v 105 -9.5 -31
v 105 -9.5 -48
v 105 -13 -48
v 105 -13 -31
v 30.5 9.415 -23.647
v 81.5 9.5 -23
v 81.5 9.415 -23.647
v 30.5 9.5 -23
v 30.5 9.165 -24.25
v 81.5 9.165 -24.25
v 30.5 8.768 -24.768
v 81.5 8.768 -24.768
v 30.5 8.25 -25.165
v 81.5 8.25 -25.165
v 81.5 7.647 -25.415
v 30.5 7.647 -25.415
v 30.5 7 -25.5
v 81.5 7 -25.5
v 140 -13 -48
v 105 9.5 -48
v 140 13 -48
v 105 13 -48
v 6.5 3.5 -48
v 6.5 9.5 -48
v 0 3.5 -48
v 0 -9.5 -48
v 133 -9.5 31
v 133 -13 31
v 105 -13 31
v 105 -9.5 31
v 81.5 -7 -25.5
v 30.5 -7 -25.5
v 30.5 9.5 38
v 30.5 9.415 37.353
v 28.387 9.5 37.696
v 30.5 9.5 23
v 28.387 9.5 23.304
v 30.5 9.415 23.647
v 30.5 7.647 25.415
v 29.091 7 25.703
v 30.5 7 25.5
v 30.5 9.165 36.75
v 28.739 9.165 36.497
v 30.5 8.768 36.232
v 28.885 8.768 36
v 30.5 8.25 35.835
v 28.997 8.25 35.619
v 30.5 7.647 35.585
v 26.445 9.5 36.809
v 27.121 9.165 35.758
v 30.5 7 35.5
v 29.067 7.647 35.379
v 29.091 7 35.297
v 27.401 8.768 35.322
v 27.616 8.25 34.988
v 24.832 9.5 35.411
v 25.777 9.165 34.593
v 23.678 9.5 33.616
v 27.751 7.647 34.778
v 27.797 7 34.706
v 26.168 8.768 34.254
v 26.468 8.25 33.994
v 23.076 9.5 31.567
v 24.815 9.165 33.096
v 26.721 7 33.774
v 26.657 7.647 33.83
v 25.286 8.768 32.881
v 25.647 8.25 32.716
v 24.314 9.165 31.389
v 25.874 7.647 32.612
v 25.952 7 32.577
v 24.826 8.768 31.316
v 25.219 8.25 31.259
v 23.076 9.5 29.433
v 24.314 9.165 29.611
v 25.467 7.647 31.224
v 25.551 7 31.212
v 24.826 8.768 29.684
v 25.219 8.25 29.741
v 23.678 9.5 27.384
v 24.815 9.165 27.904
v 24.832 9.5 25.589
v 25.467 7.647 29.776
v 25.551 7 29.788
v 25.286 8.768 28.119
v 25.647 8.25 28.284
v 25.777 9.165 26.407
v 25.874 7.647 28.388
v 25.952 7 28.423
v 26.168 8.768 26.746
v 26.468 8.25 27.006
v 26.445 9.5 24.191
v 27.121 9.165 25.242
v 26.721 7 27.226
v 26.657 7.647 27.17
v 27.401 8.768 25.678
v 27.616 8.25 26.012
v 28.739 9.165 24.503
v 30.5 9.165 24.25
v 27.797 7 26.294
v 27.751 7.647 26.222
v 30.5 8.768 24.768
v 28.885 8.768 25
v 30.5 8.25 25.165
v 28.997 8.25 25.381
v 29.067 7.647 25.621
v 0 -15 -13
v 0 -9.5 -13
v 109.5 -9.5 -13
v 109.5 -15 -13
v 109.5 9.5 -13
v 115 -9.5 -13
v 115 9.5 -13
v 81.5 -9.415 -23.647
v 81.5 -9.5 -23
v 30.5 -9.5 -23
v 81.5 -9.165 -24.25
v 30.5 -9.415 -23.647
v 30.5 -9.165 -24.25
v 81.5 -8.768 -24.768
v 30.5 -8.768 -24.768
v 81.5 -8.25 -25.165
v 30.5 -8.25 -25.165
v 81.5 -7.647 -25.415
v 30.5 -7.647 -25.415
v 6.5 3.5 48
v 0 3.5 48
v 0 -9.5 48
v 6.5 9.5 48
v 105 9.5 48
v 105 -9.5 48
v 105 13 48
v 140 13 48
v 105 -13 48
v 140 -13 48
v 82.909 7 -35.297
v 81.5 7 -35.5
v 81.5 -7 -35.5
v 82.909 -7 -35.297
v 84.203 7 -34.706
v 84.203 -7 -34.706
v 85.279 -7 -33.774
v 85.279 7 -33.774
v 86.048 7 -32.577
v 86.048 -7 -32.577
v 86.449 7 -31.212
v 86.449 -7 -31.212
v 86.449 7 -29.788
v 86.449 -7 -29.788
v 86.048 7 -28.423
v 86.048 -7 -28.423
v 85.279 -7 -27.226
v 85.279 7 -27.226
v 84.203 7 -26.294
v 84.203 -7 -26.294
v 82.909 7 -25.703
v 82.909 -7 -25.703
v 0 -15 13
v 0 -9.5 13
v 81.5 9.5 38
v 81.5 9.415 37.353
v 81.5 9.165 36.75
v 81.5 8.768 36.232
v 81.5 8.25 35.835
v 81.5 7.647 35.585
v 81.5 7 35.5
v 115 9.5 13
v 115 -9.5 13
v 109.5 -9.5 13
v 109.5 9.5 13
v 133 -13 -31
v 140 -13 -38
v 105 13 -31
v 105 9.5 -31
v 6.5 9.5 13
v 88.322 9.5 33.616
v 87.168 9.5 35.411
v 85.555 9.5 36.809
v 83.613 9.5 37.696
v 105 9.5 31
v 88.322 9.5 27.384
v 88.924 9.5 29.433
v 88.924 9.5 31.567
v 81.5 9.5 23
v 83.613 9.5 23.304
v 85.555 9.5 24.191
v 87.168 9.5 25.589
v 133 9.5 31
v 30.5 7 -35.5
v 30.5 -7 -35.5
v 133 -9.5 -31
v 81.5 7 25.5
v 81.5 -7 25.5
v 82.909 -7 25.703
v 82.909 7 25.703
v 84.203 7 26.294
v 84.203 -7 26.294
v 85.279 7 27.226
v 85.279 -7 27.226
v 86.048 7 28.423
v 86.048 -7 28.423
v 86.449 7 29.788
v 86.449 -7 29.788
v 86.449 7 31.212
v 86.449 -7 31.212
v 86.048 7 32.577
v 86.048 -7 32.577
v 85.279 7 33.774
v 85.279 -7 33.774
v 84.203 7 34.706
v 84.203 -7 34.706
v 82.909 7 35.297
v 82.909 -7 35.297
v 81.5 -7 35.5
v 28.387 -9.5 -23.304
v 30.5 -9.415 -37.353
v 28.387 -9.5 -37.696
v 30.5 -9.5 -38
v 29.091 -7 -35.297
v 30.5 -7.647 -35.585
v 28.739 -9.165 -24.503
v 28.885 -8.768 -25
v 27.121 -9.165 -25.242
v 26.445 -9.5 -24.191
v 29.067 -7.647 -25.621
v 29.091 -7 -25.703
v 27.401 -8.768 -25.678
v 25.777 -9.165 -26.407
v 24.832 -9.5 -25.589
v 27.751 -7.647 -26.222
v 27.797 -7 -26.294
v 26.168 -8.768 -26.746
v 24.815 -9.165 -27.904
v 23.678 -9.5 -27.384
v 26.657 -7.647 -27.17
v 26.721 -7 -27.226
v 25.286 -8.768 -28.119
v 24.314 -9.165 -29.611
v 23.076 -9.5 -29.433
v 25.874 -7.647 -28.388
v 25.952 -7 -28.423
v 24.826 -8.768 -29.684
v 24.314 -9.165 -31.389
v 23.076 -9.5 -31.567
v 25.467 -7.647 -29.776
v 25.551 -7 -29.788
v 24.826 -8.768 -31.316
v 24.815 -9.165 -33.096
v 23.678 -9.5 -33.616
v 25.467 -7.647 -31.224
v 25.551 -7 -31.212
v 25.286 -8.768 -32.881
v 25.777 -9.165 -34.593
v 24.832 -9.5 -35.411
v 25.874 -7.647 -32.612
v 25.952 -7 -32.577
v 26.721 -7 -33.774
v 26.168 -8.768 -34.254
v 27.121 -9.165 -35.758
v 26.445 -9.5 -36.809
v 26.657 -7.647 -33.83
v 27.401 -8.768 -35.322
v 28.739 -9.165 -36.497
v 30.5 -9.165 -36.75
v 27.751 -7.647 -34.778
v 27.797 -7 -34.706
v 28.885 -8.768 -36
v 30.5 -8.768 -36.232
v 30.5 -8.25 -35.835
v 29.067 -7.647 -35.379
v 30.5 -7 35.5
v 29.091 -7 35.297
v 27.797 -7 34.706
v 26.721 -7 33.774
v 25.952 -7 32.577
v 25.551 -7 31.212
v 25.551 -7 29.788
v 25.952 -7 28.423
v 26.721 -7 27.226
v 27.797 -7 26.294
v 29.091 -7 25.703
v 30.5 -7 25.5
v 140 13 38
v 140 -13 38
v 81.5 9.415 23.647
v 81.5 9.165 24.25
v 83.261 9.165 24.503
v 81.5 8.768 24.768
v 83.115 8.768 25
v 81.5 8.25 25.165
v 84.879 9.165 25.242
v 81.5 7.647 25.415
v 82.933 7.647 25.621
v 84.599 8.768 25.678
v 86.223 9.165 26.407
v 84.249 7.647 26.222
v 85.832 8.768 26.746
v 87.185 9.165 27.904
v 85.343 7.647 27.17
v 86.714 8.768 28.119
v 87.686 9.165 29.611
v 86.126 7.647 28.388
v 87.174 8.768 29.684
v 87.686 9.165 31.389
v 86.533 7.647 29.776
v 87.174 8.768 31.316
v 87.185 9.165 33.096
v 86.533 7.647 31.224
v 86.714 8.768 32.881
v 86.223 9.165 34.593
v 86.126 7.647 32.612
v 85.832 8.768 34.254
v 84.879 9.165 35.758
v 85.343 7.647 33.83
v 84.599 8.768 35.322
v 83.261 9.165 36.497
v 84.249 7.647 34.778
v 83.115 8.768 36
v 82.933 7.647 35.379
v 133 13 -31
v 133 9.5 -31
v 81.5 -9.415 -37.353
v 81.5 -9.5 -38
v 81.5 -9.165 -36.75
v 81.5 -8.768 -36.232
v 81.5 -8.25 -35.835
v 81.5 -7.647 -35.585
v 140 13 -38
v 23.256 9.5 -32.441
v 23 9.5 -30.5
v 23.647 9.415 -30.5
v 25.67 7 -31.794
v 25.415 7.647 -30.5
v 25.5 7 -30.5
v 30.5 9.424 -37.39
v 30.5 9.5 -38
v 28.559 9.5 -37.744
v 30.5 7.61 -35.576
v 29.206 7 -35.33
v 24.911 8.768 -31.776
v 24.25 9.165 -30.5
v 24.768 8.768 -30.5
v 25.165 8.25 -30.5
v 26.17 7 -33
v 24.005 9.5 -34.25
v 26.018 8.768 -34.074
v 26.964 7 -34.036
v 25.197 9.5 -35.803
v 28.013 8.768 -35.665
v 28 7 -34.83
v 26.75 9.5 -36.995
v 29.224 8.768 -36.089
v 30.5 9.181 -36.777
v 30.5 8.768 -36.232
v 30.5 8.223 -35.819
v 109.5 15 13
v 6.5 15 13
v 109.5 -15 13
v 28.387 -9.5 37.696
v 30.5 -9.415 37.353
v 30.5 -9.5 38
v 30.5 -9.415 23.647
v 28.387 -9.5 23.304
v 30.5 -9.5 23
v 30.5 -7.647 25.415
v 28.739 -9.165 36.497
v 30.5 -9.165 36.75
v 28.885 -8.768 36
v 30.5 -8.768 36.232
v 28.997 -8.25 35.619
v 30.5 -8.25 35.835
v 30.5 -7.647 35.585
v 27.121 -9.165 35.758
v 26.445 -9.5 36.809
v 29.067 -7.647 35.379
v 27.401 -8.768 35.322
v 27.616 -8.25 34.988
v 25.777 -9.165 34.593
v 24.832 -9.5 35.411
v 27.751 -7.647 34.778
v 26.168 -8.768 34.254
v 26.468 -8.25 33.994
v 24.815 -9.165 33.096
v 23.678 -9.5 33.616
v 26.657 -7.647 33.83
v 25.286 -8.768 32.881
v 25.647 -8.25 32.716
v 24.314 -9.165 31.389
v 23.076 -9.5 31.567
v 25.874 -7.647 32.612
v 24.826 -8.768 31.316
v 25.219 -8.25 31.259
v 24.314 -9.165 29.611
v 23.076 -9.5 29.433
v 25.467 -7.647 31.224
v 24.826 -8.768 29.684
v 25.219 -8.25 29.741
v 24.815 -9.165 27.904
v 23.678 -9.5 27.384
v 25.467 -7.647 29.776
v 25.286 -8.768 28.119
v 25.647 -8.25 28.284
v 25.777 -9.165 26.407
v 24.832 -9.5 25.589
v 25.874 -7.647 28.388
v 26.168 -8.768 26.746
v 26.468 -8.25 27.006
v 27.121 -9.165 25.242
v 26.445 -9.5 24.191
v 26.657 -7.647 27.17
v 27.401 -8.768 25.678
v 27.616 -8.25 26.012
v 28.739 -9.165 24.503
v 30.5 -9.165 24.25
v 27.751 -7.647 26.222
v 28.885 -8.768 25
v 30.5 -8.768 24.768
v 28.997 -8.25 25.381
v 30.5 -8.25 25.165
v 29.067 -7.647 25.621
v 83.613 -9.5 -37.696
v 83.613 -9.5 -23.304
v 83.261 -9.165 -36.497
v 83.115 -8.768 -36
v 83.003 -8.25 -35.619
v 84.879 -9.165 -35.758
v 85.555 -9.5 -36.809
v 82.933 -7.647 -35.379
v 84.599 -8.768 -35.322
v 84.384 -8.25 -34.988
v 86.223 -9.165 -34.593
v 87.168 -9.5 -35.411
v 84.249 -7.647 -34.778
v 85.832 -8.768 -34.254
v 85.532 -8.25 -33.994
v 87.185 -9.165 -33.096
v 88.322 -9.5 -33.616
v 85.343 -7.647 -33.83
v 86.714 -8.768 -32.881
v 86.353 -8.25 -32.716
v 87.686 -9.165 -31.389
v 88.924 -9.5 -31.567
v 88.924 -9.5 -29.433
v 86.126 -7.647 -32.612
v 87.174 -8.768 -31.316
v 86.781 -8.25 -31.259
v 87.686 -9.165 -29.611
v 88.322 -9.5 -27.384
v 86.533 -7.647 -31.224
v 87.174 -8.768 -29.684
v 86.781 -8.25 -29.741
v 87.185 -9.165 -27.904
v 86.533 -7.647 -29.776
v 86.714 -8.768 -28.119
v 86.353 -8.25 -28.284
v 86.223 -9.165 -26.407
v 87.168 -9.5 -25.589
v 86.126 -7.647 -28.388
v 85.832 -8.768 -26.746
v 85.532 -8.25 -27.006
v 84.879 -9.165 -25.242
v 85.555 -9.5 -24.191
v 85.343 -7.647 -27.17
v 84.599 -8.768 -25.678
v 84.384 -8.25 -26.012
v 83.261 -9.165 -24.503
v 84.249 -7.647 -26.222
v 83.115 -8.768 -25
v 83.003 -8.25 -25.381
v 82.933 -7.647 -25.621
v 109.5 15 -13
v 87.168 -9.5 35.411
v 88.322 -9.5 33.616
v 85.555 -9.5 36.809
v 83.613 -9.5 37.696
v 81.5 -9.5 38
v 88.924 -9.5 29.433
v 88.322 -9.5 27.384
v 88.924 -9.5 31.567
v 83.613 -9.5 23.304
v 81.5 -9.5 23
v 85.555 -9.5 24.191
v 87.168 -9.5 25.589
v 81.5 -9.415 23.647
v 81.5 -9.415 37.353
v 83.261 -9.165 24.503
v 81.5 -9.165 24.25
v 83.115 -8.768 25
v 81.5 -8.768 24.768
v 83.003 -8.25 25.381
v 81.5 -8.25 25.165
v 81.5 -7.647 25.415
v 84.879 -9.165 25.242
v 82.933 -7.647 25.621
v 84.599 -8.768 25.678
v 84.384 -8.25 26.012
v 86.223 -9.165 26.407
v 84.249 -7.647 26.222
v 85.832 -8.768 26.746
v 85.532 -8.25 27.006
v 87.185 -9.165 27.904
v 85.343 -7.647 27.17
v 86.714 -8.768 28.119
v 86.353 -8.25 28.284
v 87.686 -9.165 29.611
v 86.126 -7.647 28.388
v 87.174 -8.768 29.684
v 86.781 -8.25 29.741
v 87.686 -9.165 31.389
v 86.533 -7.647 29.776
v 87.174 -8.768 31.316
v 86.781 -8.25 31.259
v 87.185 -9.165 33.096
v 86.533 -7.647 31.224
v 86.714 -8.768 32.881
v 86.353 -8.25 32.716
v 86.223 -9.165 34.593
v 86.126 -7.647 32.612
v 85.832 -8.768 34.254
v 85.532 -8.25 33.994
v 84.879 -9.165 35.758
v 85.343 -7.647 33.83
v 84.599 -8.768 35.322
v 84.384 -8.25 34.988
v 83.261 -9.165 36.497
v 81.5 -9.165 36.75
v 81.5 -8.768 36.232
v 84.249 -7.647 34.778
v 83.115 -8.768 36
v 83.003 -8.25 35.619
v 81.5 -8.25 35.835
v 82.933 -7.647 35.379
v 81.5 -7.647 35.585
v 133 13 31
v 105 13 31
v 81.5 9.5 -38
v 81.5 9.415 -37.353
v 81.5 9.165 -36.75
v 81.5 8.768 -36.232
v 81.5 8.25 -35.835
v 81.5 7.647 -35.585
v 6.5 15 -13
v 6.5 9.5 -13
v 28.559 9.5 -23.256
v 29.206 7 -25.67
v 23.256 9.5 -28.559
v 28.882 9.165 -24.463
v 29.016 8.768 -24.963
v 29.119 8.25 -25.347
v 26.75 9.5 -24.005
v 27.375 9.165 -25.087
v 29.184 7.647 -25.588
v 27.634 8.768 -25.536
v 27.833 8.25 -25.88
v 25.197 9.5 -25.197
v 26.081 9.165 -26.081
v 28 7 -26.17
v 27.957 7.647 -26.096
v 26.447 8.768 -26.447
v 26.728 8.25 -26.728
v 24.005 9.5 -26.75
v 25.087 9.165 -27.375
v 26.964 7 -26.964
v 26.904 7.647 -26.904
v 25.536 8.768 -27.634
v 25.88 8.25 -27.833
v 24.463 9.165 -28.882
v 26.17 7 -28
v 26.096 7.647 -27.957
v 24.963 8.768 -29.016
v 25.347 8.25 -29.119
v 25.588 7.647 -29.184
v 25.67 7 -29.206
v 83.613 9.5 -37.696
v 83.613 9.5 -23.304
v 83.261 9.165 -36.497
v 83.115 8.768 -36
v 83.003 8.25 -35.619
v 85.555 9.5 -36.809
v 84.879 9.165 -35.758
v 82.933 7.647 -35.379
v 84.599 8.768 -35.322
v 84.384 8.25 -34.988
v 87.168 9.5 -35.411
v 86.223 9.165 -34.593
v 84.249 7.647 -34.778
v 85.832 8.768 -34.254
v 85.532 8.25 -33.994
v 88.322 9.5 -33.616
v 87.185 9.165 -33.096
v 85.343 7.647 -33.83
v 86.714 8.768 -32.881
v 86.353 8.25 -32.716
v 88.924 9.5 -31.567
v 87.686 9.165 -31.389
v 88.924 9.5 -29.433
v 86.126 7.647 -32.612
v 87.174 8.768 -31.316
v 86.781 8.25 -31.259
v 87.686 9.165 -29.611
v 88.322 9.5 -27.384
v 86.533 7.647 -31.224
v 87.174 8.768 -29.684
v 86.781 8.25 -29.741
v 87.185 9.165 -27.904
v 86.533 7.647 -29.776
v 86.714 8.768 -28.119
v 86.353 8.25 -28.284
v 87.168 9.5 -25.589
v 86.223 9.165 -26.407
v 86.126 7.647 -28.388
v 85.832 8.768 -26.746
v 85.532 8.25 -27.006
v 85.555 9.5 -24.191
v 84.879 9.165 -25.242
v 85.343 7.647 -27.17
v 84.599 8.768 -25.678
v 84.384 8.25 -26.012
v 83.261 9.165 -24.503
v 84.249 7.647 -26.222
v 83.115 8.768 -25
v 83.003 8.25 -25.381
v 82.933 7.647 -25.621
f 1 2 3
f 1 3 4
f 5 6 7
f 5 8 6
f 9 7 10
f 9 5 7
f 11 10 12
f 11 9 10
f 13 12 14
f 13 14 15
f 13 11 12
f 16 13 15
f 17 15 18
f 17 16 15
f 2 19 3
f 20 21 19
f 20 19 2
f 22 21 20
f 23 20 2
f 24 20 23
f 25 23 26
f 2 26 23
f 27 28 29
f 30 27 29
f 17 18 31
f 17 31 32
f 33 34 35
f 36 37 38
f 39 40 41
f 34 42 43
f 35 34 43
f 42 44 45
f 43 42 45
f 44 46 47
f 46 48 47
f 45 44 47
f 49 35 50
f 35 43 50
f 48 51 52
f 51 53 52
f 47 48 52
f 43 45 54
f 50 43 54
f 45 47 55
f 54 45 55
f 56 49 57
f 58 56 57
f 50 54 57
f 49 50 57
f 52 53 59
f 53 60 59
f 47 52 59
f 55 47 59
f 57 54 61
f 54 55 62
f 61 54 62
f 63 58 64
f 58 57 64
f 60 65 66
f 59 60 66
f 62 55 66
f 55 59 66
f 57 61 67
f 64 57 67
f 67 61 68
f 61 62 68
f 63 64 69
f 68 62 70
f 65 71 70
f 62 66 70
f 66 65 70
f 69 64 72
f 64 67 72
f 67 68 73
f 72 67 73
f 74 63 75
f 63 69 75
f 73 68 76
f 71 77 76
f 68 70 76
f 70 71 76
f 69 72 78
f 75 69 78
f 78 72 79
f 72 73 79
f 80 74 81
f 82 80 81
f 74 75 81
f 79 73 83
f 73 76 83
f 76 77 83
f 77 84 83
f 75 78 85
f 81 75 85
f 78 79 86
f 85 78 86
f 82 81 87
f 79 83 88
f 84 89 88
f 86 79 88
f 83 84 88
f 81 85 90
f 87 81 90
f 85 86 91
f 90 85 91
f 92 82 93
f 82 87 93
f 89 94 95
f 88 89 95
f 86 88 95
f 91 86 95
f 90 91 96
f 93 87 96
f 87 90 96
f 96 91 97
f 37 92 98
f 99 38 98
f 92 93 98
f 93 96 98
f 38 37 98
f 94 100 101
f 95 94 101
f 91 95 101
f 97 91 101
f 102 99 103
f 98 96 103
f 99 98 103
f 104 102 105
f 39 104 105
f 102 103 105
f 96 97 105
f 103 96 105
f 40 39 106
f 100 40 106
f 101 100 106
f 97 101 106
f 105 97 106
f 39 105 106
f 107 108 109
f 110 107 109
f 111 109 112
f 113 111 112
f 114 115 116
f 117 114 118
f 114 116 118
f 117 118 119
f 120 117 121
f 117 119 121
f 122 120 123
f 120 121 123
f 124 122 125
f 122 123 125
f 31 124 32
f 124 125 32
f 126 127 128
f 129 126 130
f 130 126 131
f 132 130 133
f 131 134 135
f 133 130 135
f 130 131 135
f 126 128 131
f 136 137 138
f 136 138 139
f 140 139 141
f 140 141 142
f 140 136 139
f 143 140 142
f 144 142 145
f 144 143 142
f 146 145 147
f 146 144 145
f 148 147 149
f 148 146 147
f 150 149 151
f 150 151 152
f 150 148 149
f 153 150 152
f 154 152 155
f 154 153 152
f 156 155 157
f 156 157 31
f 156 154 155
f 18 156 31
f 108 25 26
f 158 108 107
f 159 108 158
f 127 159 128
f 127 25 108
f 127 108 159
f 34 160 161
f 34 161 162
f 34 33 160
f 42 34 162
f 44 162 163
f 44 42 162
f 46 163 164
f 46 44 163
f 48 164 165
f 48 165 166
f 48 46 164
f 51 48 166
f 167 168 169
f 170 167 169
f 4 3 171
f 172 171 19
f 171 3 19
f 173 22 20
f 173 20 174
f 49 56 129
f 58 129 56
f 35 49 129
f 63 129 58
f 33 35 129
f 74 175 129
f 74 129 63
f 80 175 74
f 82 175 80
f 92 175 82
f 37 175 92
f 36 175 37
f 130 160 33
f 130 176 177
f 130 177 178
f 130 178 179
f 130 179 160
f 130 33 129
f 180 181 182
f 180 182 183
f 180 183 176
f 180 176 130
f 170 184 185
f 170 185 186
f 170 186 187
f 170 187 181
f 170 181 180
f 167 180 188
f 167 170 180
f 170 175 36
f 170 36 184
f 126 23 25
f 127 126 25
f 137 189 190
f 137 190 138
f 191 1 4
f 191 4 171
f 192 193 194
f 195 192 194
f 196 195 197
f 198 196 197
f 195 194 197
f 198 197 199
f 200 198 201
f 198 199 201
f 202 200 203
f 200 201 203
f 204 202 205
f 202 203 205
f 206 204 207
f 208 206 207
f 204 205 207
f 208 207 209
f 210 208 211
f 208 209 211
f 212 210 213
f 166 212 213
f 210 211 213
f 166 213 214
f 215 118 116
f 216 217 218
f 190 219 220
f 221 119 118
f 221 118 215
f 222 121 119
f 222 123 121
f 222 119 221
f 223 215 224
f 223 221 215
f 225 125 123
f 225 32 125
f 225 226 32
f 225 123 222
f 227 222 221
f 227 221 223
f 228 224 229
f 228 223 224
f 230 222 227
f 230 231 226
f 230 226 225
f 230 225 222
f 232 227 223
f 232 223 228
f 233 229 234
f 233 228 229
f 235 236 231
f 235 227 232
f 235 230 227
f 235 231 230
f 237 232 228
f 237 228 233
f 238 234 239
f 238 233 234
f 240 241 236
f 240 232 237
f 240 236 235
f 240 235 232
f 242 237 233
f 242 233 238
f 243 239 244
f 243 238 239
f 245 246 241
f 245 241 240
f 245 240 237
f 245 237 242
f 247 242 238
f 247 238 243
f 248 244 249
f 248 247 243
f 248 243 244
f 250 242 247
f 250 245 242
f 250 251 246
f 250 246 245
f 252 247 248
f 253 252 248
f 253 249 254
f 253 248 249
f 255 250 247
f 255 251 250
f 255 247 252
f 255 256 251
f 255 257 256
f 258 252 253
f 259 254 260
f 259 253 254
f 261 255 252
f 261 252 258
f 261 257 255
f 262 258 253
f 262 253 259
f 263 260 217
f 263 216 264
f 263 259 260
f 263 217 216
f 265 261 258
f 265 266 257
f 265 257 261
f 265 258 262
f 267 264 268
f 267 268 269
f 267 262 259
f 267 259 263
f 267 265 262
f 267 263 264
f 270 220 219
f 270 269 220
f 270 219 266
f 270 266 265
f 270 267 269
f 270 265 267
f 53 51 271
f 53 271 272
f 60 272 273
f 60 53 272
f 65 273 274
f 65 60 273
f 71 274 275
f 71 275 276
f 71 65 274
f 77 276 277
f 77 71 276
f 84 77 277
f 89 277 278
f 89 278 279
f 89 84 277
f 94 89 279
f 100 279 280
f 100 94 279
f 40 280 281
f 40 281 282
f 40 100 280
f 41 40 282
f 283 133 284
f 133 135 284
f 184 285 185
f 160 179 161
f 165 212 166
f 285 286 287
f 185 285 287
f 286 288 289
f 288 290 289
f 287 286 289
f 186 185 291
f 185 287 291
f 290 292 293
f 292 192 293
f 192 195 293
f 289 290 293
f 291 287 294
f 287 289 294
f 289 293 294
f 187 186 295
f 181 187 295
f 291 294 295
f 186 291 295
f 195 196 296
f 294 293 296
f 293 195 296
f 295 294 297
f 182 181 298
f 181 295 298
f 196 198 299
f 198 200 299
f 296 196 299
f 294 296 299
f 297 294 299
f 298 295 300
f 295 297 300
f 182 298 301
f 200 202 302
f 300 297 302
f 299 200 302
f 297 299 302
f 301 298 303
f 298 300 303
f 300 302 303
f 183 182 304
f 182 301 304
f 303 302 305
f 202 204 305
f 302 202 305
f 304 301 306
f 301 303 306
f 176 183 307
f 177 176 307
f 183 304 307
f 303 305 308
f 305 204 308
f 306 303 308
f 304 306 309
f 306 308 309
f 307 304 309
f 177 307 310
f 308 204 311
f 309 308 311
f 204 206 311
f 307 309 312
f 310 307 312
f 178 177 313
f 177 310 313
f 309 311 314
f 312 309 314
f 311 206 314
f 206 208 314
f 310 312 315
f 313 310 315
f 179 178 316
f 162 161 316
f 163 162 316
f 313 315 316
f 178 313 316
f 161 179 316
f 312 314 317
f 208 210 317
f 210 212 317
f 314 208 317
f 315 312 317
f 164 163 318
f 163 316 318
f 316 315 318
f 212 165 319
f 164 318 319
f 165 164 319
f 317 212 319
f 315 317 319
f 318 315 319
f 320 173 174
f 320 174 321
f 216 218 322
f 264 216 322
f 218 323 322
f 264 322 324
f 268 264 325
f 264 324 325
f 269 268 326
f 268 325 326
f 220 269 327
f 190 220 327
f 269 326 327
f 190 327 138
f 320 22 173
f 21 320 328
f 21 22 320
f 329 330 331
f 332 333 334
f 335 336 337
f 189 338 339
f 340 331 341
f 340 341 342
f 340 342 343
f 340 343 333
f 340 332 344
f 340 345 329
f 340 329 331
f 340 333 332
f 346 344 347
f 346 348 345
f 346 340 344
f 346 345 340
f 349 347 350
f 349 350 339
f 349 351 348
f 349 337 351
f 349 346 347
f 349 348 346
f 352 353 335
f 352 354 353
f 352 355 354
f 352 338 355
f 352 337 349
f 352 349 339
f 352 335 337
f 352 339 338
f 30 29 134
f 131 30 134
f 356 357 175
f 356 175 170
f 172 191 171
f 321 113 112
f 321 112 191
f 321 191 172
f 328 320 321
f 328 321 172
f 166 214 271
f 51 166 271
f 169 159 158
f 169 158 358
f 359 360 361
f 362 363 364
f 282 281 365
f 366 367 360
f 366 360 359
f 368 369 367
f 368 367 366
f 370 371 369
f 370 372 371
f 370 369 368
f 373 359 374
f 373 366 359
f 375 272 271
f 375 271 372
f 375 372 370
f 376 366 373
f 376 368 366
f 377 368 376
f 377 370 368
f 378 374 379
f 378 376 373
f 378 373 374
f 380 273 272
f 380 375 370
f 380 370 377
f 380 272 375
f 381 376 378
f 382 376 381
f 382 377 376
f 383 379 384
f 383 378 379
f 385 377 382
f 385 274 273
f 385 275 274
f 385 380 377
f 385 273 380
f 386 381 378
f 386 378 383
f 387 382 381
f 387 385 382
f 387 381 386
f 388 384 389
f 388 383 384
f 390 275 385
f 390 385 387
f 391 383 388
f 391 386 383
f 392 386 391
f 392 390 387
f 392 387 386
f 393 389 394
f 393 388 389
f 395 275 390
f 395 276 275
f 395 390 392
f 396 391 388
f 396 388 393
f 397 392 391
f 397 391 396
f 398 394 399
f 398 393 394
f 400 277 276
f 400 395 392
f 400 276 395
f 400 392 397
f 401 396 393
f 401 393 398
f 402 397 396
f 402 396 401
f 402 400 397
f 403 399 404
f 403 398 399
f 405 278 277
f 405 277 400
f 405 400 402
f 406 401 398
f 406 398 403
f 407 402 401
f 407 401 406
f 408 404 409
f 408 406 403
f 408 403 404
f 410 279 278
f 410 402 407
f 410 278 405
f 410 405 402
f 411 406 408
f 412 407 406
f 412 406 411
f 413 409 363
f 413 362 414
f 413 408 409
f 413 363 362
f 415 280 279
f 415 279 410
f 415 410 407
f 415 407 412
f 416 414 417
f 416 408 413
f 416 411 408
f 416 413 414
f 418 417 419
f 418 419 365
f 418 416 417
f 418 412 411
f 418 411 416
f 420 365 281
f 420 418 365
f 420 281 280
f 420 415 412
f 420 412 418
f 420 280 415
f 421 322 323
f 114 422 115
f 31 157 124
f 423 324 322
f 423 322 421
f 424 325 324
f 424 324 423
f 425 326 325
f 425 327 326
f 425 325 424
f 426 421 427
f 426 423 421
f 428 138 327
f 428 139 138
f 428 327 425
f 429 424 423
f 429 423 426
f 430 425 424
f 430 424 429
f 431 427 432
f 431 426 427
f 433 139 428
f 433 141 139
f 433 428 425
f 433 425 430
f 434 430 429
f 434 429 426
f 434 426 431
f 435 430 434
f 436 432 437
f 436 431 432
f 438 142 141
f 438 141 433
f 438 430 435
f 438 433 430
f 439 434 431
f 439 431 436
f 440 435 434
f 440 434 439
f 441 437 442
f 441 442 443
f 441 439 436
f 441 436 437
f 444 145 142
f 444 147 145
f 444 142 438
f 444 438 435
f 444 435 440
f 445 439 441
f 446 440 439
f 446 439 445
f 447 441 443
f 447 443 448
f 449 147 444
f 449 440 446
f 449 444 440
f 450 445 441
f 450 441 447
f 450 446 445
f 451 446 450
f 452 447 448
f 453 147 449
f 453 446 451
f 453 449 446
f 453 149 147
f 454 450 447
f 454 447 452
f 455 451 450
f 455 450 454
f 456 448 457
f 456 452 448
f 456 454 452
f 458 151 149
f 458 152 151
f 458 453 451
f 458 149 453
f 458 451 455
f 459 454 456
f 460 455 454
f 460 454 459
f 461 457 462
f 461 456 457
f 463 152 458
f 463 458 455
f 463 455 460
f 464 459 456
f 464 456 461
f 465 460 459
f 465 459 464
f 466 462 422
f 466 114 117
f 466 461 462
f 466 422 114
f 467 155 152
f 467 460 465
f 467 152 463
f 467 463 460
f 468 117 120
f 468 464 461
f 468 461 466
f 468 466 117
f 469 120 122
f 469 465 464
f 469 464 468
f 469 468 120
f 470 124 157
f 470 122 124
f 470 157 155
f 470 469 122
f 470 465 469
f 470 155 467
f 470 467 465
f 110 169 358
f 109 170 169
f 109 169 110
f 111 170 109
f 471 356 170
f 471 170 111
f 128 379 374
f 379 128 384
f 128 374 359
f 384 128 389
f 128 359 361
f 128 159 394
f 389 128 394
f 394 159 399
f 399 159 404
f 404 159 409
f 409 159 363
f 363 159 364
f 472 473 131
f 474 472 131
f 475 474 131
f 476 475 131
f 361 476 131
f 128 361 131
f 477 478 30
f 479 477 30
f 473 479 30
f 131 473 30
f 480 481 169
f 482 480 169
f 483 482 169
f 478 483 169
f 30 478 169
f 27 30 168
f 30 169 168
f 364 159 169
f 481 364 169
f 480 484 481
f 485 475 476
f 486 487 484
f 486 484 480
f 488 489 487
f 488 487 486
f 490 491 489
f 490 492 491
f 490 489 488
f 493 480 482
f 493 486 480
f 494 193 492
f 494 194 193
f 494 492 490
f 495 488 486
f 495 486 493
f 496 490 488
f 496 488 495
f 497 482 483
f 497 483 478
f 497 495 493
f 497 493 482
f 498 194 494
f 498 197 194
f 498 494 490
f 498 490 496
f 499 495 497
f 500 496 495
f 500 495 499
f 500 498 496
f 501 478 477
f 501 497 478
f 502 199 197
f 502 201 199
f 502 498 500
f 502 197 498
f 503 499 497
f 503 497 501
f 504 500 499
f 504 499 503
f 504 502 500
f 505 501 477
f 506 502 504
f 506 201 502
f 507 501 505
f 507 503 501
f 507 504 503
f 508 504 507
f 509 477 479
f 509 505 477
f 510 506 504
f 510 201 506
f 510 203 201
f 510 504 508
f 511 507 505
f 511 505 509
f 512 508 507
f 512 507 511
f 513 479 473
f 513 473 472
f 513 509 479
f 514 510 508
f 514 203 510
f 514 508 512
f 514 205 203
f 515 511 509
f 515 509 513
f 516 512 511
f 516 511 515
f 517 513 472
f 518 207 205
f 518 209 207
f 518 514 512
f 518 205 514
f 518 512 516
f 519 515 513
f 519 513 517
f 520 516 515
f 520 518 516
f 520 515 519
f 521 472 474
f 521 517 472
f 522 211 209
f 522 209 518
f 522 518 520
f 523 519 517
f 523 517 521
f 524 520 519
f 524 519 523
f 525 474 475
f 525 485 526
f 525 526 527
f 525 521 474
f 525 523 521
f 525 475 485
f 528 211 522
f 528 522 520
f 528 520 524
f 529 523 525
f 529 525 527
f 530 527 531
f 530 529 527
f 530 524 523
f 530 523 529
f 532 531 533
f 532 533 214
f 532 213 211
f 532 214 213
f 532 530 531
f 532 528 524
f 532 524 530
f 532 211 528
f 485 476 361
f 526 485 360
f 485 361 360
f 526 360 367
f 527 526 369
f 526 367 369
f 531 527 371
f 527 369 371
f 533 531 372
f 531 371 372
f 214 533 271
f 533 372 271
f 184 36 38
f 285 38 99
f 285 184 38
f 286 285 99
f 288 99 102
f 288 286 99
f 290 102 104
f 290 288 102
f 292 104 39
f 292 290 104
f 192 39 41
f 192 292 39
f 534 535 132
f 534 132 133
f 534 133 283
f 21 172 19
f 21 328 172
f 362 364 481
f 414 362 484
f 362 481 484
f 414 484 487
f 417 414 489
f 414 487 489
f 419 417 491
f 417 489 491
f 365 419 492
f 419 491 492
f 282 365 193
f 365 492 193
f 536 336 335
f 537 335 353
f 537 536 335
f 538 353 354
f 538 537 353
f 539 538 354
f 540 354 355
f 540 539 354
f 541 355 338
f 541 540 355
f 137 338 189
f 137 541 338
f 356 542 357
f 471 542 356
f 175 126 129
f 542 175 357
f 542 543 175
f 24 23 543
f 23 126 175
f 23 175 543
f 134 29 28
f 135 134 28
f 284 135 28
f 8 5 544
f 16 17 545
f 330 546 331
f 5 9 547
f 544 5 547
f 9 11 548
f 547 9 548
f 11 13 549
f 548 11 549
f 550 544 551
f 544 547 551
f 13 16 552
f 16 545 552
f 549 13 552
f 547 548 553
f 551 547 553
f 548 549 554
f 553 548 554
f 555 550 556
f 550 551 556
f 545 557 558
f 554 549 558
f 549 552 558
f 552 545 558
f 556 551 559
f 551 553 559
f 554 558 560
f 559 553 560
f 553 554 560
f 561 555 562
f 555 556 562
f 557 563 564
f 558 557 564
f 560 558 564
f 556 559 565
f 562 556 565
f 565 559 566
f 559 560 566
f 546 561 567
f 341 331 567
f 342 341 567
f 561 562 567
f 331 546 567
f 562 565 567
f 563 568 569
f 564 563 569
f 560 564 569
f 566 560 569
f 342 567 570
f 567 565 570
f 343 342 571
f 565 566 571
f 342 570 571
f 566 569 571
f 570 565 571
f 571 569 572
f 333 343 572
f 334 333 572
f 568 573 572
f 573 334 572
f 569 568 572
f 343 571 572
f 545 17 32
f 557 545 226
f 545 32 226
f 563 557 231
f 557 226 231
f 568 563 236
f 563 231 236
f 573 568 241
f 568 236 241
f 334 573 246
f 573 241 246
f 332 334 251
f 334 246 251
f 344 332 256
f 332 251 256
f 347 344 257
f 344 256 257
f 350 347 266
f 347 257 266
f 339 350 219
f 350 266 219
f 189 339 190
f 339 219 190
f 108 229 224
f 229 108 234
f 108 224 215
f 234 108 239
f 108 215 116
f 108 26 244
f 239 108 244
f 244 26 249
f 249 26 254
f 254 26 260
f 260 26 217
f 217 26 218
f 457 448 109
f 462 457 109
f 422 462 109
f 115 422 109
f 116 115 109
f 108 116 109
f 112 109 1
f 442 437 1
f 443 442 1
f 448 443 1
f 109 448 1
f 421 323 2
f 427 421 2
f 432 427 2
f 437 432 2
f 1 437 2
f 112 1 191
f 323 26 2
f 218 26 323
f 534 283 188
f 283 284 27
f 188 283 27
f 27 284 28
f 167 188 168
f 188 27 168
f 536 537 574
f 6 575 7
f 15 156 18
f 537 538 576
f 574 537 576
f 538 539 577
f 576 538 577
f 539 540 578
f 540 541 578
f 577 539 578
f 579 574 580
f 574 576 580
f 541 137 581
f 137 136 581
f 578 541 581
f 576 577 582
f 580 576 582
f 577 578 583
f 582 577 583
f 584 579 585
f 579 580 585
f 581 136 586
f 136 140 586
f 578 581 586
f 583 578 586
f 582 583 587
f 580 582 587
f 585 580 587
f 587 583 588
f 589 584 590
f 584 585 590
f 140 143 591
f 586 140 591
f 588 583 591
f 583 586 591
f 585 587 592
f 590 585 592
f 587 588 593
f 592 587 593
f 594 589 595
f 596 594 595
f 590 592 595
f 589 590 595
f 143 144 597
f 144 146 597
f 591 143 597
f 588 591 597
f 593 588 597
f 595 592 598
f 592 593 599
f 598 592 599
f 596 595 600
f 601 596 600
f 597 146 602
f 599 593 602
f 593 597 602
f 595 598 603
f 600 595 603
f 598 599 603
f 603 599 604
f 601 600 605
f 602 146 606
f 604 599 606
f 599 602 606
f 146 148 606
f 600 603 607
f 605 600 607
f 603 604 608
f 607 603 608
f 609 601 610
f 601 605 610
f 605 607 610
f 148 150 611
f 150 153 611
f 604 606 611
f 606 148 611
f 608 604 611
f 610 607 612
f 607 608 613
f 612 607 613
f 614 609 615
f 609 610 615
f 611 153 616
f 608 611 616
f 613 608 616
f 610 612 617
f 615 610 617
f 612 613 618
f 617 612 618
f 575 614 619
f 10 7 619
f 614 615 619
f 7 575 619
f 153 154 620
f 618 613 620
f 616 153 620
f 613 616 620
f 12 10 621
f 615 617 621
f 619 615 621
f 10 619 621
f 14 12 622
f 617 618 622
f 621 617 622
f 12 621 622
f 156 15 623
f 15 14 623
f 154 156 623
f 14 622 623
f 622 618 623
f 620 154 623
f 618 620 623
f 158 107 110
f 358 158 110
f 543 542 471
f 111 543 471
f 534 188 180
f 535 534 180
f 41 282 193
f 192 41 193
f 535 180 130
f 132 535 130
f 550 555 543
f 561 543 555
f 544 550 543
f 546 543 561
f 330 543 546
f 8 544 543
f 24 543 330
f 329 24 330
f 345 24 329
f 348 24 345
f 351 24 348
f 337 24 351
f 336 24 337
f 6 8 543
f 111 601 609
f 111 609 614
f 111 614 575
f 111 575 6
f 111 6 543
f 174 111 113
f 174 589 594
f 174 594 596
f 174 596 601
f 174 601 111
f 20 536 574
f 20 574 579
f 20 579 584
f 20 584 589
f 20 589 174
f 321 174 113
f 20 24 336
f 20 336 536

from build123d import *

# Parameters (mm, degrees)
SKETCH1_W           = 109.5
SKETCH1_H           = 26
BOSS_EXTRUDE2_DEPTH = 15
BOSS_EXTRUDE5_DEPTH = 9.5
BOSS_EXTRUDE6_DEPTH = 13
SKETCH2_W           = 6.5
SKETCH2_H           = 11.5
CUT_EXTRUDE1_DEPTH  = 171.414201286
FILLET1_R           = 2.5


with BuildPart() as part:
    # Sketch1 → Boss-Extrude2 (new, symmetric)
    with BuildSketch(Plane(origin=(0, 0, 0), x_dir=(1, 0, 0), z_dir=(0, 1, 0))):
        with Locations((54.75, 0)):
            Rectangle(SKETCH1_W, SKETCH1_H)
    extrude(amount=BOSS_EXTRUDE2_DEPTH, both=True)

    # Sketch1<6> → Boss-Extrude5 (add, symmetric)
    # profile 1 of 2: a face of its own
    with BuildSketch(Plane(origin=(0, 0, 0), x_dir=(1, 0, 0), z_dir=(0, 1, 0))):
        Polygon((0, -30.5), (0, -48), (105, -48), (105, -31), (133, -31), (115, -13), (0, -13), align=None)
        with BuildLine():
            ThreePointArc((30.5, -35.5), (26.964466094, -34.035533906), (25.5, -30.5))
            ThreePointArc((25.5, -30.5), (26.964466094, -26.964466094), (30.5, -25.5))
            Line((30.5, -25.5), (81.5, -25.5))
            ThreePointArc((81.5, -25.5), (86.5, -30.5), (81.5, -35.5))
            Line((81.5, -35.5), (30.5, -35.5))
        make_face(mode=Mode.SUBTRACT)
    # profile 2 of 2: a face of its own
    with BuildSketch(Plane(origin=(0, 0, 0), x_dir=(1, 0, 0), z_dir=(0, 1, 0))):
        Polygon((0, 30.5), (0, 13), (115, 13), (133, 31), (105, 31), (105, 48), (0, 48), align=None)
        with BuildLine():
            ThreePointArc((30.5, 25.5), (26.964466094, 26.964466094), (25.5, 30.5))
            ThreePointArc((25.5, 30.5), (26.964466094, 34.035533906), (30.5, 35.5))
            Line((30.5, 35.5), (81.5, 35.5))
            ThreePointArc((81.5, 35.5), (86.5, 30.5), (81.5, 25.5))
            Line((81.5, 25.5), (30.5, 25.5))
        make_face(mode=Mode.SUBTRACT)
    extrude(amount=BOSS_EXTRUDE5_DEPTH, both=True)

    # Sketch1<7> → Boss-Extrude6 (add, symmetric)
    with BuildSketch(Plane(origin=(0, 0, 0), x_dir=(1, 0, 0), z_dir=(0, 1, 0))):
        Polygon((105, -31), (105, -48), (140, -48), (140, -38), (133, -31), align=None)
        Polygon((140, 48), (105, 48), (105, 31), (133, 31), (140, 38), align=None)
    extrude(amount=BOSS_EXTRUDE6_DEPTH, both=True)

    # Sketch2 → Cut-Extrude1 (cut, through all)
    with BuildSketch(Plane(origin=(0, 0, -48), x_dir=(-1, 0, 0), z_dir=(0, 0, -1))):
        with Locations((-3.25, 9.25)):
            Rectangle(SKETCH2_W, SKETCH2_H)
    extrude(amount=-CUT_EXTRUDE1_DEPTH, mode=Mode.SUBTRACT)

    # Fillet1
    fillet1_edges = [part.edges().sort_by_distance(p)[0] for p in [
        (25.5, 9.5, -30.5),
        (56, -9.5, -35.5),
        (86.5, 9.5, -30.5),
        (56, 9.5, -25.5),
        (56, 9.5, -35.5),
        (25.5, -9.5, -30.5),
        (56, -9.5, -25.5),
        (86.5, -9.5, -30.5),
        (25.5, -9.5, 30.5),
        (56, -9.5, 25.5),
        (86.5, -9.5, 30.5),
        (56, 9.5, 35.5),
        (25.5, 9.5, 30.5),
        (56, 9.5, 25.5),
        (86.5, 9.5, 30.5),
        (56, -9.5, 35.5),
    ]]
    fillet(fillet1_edges, radius=FILLET1_R)


solid = part.part
